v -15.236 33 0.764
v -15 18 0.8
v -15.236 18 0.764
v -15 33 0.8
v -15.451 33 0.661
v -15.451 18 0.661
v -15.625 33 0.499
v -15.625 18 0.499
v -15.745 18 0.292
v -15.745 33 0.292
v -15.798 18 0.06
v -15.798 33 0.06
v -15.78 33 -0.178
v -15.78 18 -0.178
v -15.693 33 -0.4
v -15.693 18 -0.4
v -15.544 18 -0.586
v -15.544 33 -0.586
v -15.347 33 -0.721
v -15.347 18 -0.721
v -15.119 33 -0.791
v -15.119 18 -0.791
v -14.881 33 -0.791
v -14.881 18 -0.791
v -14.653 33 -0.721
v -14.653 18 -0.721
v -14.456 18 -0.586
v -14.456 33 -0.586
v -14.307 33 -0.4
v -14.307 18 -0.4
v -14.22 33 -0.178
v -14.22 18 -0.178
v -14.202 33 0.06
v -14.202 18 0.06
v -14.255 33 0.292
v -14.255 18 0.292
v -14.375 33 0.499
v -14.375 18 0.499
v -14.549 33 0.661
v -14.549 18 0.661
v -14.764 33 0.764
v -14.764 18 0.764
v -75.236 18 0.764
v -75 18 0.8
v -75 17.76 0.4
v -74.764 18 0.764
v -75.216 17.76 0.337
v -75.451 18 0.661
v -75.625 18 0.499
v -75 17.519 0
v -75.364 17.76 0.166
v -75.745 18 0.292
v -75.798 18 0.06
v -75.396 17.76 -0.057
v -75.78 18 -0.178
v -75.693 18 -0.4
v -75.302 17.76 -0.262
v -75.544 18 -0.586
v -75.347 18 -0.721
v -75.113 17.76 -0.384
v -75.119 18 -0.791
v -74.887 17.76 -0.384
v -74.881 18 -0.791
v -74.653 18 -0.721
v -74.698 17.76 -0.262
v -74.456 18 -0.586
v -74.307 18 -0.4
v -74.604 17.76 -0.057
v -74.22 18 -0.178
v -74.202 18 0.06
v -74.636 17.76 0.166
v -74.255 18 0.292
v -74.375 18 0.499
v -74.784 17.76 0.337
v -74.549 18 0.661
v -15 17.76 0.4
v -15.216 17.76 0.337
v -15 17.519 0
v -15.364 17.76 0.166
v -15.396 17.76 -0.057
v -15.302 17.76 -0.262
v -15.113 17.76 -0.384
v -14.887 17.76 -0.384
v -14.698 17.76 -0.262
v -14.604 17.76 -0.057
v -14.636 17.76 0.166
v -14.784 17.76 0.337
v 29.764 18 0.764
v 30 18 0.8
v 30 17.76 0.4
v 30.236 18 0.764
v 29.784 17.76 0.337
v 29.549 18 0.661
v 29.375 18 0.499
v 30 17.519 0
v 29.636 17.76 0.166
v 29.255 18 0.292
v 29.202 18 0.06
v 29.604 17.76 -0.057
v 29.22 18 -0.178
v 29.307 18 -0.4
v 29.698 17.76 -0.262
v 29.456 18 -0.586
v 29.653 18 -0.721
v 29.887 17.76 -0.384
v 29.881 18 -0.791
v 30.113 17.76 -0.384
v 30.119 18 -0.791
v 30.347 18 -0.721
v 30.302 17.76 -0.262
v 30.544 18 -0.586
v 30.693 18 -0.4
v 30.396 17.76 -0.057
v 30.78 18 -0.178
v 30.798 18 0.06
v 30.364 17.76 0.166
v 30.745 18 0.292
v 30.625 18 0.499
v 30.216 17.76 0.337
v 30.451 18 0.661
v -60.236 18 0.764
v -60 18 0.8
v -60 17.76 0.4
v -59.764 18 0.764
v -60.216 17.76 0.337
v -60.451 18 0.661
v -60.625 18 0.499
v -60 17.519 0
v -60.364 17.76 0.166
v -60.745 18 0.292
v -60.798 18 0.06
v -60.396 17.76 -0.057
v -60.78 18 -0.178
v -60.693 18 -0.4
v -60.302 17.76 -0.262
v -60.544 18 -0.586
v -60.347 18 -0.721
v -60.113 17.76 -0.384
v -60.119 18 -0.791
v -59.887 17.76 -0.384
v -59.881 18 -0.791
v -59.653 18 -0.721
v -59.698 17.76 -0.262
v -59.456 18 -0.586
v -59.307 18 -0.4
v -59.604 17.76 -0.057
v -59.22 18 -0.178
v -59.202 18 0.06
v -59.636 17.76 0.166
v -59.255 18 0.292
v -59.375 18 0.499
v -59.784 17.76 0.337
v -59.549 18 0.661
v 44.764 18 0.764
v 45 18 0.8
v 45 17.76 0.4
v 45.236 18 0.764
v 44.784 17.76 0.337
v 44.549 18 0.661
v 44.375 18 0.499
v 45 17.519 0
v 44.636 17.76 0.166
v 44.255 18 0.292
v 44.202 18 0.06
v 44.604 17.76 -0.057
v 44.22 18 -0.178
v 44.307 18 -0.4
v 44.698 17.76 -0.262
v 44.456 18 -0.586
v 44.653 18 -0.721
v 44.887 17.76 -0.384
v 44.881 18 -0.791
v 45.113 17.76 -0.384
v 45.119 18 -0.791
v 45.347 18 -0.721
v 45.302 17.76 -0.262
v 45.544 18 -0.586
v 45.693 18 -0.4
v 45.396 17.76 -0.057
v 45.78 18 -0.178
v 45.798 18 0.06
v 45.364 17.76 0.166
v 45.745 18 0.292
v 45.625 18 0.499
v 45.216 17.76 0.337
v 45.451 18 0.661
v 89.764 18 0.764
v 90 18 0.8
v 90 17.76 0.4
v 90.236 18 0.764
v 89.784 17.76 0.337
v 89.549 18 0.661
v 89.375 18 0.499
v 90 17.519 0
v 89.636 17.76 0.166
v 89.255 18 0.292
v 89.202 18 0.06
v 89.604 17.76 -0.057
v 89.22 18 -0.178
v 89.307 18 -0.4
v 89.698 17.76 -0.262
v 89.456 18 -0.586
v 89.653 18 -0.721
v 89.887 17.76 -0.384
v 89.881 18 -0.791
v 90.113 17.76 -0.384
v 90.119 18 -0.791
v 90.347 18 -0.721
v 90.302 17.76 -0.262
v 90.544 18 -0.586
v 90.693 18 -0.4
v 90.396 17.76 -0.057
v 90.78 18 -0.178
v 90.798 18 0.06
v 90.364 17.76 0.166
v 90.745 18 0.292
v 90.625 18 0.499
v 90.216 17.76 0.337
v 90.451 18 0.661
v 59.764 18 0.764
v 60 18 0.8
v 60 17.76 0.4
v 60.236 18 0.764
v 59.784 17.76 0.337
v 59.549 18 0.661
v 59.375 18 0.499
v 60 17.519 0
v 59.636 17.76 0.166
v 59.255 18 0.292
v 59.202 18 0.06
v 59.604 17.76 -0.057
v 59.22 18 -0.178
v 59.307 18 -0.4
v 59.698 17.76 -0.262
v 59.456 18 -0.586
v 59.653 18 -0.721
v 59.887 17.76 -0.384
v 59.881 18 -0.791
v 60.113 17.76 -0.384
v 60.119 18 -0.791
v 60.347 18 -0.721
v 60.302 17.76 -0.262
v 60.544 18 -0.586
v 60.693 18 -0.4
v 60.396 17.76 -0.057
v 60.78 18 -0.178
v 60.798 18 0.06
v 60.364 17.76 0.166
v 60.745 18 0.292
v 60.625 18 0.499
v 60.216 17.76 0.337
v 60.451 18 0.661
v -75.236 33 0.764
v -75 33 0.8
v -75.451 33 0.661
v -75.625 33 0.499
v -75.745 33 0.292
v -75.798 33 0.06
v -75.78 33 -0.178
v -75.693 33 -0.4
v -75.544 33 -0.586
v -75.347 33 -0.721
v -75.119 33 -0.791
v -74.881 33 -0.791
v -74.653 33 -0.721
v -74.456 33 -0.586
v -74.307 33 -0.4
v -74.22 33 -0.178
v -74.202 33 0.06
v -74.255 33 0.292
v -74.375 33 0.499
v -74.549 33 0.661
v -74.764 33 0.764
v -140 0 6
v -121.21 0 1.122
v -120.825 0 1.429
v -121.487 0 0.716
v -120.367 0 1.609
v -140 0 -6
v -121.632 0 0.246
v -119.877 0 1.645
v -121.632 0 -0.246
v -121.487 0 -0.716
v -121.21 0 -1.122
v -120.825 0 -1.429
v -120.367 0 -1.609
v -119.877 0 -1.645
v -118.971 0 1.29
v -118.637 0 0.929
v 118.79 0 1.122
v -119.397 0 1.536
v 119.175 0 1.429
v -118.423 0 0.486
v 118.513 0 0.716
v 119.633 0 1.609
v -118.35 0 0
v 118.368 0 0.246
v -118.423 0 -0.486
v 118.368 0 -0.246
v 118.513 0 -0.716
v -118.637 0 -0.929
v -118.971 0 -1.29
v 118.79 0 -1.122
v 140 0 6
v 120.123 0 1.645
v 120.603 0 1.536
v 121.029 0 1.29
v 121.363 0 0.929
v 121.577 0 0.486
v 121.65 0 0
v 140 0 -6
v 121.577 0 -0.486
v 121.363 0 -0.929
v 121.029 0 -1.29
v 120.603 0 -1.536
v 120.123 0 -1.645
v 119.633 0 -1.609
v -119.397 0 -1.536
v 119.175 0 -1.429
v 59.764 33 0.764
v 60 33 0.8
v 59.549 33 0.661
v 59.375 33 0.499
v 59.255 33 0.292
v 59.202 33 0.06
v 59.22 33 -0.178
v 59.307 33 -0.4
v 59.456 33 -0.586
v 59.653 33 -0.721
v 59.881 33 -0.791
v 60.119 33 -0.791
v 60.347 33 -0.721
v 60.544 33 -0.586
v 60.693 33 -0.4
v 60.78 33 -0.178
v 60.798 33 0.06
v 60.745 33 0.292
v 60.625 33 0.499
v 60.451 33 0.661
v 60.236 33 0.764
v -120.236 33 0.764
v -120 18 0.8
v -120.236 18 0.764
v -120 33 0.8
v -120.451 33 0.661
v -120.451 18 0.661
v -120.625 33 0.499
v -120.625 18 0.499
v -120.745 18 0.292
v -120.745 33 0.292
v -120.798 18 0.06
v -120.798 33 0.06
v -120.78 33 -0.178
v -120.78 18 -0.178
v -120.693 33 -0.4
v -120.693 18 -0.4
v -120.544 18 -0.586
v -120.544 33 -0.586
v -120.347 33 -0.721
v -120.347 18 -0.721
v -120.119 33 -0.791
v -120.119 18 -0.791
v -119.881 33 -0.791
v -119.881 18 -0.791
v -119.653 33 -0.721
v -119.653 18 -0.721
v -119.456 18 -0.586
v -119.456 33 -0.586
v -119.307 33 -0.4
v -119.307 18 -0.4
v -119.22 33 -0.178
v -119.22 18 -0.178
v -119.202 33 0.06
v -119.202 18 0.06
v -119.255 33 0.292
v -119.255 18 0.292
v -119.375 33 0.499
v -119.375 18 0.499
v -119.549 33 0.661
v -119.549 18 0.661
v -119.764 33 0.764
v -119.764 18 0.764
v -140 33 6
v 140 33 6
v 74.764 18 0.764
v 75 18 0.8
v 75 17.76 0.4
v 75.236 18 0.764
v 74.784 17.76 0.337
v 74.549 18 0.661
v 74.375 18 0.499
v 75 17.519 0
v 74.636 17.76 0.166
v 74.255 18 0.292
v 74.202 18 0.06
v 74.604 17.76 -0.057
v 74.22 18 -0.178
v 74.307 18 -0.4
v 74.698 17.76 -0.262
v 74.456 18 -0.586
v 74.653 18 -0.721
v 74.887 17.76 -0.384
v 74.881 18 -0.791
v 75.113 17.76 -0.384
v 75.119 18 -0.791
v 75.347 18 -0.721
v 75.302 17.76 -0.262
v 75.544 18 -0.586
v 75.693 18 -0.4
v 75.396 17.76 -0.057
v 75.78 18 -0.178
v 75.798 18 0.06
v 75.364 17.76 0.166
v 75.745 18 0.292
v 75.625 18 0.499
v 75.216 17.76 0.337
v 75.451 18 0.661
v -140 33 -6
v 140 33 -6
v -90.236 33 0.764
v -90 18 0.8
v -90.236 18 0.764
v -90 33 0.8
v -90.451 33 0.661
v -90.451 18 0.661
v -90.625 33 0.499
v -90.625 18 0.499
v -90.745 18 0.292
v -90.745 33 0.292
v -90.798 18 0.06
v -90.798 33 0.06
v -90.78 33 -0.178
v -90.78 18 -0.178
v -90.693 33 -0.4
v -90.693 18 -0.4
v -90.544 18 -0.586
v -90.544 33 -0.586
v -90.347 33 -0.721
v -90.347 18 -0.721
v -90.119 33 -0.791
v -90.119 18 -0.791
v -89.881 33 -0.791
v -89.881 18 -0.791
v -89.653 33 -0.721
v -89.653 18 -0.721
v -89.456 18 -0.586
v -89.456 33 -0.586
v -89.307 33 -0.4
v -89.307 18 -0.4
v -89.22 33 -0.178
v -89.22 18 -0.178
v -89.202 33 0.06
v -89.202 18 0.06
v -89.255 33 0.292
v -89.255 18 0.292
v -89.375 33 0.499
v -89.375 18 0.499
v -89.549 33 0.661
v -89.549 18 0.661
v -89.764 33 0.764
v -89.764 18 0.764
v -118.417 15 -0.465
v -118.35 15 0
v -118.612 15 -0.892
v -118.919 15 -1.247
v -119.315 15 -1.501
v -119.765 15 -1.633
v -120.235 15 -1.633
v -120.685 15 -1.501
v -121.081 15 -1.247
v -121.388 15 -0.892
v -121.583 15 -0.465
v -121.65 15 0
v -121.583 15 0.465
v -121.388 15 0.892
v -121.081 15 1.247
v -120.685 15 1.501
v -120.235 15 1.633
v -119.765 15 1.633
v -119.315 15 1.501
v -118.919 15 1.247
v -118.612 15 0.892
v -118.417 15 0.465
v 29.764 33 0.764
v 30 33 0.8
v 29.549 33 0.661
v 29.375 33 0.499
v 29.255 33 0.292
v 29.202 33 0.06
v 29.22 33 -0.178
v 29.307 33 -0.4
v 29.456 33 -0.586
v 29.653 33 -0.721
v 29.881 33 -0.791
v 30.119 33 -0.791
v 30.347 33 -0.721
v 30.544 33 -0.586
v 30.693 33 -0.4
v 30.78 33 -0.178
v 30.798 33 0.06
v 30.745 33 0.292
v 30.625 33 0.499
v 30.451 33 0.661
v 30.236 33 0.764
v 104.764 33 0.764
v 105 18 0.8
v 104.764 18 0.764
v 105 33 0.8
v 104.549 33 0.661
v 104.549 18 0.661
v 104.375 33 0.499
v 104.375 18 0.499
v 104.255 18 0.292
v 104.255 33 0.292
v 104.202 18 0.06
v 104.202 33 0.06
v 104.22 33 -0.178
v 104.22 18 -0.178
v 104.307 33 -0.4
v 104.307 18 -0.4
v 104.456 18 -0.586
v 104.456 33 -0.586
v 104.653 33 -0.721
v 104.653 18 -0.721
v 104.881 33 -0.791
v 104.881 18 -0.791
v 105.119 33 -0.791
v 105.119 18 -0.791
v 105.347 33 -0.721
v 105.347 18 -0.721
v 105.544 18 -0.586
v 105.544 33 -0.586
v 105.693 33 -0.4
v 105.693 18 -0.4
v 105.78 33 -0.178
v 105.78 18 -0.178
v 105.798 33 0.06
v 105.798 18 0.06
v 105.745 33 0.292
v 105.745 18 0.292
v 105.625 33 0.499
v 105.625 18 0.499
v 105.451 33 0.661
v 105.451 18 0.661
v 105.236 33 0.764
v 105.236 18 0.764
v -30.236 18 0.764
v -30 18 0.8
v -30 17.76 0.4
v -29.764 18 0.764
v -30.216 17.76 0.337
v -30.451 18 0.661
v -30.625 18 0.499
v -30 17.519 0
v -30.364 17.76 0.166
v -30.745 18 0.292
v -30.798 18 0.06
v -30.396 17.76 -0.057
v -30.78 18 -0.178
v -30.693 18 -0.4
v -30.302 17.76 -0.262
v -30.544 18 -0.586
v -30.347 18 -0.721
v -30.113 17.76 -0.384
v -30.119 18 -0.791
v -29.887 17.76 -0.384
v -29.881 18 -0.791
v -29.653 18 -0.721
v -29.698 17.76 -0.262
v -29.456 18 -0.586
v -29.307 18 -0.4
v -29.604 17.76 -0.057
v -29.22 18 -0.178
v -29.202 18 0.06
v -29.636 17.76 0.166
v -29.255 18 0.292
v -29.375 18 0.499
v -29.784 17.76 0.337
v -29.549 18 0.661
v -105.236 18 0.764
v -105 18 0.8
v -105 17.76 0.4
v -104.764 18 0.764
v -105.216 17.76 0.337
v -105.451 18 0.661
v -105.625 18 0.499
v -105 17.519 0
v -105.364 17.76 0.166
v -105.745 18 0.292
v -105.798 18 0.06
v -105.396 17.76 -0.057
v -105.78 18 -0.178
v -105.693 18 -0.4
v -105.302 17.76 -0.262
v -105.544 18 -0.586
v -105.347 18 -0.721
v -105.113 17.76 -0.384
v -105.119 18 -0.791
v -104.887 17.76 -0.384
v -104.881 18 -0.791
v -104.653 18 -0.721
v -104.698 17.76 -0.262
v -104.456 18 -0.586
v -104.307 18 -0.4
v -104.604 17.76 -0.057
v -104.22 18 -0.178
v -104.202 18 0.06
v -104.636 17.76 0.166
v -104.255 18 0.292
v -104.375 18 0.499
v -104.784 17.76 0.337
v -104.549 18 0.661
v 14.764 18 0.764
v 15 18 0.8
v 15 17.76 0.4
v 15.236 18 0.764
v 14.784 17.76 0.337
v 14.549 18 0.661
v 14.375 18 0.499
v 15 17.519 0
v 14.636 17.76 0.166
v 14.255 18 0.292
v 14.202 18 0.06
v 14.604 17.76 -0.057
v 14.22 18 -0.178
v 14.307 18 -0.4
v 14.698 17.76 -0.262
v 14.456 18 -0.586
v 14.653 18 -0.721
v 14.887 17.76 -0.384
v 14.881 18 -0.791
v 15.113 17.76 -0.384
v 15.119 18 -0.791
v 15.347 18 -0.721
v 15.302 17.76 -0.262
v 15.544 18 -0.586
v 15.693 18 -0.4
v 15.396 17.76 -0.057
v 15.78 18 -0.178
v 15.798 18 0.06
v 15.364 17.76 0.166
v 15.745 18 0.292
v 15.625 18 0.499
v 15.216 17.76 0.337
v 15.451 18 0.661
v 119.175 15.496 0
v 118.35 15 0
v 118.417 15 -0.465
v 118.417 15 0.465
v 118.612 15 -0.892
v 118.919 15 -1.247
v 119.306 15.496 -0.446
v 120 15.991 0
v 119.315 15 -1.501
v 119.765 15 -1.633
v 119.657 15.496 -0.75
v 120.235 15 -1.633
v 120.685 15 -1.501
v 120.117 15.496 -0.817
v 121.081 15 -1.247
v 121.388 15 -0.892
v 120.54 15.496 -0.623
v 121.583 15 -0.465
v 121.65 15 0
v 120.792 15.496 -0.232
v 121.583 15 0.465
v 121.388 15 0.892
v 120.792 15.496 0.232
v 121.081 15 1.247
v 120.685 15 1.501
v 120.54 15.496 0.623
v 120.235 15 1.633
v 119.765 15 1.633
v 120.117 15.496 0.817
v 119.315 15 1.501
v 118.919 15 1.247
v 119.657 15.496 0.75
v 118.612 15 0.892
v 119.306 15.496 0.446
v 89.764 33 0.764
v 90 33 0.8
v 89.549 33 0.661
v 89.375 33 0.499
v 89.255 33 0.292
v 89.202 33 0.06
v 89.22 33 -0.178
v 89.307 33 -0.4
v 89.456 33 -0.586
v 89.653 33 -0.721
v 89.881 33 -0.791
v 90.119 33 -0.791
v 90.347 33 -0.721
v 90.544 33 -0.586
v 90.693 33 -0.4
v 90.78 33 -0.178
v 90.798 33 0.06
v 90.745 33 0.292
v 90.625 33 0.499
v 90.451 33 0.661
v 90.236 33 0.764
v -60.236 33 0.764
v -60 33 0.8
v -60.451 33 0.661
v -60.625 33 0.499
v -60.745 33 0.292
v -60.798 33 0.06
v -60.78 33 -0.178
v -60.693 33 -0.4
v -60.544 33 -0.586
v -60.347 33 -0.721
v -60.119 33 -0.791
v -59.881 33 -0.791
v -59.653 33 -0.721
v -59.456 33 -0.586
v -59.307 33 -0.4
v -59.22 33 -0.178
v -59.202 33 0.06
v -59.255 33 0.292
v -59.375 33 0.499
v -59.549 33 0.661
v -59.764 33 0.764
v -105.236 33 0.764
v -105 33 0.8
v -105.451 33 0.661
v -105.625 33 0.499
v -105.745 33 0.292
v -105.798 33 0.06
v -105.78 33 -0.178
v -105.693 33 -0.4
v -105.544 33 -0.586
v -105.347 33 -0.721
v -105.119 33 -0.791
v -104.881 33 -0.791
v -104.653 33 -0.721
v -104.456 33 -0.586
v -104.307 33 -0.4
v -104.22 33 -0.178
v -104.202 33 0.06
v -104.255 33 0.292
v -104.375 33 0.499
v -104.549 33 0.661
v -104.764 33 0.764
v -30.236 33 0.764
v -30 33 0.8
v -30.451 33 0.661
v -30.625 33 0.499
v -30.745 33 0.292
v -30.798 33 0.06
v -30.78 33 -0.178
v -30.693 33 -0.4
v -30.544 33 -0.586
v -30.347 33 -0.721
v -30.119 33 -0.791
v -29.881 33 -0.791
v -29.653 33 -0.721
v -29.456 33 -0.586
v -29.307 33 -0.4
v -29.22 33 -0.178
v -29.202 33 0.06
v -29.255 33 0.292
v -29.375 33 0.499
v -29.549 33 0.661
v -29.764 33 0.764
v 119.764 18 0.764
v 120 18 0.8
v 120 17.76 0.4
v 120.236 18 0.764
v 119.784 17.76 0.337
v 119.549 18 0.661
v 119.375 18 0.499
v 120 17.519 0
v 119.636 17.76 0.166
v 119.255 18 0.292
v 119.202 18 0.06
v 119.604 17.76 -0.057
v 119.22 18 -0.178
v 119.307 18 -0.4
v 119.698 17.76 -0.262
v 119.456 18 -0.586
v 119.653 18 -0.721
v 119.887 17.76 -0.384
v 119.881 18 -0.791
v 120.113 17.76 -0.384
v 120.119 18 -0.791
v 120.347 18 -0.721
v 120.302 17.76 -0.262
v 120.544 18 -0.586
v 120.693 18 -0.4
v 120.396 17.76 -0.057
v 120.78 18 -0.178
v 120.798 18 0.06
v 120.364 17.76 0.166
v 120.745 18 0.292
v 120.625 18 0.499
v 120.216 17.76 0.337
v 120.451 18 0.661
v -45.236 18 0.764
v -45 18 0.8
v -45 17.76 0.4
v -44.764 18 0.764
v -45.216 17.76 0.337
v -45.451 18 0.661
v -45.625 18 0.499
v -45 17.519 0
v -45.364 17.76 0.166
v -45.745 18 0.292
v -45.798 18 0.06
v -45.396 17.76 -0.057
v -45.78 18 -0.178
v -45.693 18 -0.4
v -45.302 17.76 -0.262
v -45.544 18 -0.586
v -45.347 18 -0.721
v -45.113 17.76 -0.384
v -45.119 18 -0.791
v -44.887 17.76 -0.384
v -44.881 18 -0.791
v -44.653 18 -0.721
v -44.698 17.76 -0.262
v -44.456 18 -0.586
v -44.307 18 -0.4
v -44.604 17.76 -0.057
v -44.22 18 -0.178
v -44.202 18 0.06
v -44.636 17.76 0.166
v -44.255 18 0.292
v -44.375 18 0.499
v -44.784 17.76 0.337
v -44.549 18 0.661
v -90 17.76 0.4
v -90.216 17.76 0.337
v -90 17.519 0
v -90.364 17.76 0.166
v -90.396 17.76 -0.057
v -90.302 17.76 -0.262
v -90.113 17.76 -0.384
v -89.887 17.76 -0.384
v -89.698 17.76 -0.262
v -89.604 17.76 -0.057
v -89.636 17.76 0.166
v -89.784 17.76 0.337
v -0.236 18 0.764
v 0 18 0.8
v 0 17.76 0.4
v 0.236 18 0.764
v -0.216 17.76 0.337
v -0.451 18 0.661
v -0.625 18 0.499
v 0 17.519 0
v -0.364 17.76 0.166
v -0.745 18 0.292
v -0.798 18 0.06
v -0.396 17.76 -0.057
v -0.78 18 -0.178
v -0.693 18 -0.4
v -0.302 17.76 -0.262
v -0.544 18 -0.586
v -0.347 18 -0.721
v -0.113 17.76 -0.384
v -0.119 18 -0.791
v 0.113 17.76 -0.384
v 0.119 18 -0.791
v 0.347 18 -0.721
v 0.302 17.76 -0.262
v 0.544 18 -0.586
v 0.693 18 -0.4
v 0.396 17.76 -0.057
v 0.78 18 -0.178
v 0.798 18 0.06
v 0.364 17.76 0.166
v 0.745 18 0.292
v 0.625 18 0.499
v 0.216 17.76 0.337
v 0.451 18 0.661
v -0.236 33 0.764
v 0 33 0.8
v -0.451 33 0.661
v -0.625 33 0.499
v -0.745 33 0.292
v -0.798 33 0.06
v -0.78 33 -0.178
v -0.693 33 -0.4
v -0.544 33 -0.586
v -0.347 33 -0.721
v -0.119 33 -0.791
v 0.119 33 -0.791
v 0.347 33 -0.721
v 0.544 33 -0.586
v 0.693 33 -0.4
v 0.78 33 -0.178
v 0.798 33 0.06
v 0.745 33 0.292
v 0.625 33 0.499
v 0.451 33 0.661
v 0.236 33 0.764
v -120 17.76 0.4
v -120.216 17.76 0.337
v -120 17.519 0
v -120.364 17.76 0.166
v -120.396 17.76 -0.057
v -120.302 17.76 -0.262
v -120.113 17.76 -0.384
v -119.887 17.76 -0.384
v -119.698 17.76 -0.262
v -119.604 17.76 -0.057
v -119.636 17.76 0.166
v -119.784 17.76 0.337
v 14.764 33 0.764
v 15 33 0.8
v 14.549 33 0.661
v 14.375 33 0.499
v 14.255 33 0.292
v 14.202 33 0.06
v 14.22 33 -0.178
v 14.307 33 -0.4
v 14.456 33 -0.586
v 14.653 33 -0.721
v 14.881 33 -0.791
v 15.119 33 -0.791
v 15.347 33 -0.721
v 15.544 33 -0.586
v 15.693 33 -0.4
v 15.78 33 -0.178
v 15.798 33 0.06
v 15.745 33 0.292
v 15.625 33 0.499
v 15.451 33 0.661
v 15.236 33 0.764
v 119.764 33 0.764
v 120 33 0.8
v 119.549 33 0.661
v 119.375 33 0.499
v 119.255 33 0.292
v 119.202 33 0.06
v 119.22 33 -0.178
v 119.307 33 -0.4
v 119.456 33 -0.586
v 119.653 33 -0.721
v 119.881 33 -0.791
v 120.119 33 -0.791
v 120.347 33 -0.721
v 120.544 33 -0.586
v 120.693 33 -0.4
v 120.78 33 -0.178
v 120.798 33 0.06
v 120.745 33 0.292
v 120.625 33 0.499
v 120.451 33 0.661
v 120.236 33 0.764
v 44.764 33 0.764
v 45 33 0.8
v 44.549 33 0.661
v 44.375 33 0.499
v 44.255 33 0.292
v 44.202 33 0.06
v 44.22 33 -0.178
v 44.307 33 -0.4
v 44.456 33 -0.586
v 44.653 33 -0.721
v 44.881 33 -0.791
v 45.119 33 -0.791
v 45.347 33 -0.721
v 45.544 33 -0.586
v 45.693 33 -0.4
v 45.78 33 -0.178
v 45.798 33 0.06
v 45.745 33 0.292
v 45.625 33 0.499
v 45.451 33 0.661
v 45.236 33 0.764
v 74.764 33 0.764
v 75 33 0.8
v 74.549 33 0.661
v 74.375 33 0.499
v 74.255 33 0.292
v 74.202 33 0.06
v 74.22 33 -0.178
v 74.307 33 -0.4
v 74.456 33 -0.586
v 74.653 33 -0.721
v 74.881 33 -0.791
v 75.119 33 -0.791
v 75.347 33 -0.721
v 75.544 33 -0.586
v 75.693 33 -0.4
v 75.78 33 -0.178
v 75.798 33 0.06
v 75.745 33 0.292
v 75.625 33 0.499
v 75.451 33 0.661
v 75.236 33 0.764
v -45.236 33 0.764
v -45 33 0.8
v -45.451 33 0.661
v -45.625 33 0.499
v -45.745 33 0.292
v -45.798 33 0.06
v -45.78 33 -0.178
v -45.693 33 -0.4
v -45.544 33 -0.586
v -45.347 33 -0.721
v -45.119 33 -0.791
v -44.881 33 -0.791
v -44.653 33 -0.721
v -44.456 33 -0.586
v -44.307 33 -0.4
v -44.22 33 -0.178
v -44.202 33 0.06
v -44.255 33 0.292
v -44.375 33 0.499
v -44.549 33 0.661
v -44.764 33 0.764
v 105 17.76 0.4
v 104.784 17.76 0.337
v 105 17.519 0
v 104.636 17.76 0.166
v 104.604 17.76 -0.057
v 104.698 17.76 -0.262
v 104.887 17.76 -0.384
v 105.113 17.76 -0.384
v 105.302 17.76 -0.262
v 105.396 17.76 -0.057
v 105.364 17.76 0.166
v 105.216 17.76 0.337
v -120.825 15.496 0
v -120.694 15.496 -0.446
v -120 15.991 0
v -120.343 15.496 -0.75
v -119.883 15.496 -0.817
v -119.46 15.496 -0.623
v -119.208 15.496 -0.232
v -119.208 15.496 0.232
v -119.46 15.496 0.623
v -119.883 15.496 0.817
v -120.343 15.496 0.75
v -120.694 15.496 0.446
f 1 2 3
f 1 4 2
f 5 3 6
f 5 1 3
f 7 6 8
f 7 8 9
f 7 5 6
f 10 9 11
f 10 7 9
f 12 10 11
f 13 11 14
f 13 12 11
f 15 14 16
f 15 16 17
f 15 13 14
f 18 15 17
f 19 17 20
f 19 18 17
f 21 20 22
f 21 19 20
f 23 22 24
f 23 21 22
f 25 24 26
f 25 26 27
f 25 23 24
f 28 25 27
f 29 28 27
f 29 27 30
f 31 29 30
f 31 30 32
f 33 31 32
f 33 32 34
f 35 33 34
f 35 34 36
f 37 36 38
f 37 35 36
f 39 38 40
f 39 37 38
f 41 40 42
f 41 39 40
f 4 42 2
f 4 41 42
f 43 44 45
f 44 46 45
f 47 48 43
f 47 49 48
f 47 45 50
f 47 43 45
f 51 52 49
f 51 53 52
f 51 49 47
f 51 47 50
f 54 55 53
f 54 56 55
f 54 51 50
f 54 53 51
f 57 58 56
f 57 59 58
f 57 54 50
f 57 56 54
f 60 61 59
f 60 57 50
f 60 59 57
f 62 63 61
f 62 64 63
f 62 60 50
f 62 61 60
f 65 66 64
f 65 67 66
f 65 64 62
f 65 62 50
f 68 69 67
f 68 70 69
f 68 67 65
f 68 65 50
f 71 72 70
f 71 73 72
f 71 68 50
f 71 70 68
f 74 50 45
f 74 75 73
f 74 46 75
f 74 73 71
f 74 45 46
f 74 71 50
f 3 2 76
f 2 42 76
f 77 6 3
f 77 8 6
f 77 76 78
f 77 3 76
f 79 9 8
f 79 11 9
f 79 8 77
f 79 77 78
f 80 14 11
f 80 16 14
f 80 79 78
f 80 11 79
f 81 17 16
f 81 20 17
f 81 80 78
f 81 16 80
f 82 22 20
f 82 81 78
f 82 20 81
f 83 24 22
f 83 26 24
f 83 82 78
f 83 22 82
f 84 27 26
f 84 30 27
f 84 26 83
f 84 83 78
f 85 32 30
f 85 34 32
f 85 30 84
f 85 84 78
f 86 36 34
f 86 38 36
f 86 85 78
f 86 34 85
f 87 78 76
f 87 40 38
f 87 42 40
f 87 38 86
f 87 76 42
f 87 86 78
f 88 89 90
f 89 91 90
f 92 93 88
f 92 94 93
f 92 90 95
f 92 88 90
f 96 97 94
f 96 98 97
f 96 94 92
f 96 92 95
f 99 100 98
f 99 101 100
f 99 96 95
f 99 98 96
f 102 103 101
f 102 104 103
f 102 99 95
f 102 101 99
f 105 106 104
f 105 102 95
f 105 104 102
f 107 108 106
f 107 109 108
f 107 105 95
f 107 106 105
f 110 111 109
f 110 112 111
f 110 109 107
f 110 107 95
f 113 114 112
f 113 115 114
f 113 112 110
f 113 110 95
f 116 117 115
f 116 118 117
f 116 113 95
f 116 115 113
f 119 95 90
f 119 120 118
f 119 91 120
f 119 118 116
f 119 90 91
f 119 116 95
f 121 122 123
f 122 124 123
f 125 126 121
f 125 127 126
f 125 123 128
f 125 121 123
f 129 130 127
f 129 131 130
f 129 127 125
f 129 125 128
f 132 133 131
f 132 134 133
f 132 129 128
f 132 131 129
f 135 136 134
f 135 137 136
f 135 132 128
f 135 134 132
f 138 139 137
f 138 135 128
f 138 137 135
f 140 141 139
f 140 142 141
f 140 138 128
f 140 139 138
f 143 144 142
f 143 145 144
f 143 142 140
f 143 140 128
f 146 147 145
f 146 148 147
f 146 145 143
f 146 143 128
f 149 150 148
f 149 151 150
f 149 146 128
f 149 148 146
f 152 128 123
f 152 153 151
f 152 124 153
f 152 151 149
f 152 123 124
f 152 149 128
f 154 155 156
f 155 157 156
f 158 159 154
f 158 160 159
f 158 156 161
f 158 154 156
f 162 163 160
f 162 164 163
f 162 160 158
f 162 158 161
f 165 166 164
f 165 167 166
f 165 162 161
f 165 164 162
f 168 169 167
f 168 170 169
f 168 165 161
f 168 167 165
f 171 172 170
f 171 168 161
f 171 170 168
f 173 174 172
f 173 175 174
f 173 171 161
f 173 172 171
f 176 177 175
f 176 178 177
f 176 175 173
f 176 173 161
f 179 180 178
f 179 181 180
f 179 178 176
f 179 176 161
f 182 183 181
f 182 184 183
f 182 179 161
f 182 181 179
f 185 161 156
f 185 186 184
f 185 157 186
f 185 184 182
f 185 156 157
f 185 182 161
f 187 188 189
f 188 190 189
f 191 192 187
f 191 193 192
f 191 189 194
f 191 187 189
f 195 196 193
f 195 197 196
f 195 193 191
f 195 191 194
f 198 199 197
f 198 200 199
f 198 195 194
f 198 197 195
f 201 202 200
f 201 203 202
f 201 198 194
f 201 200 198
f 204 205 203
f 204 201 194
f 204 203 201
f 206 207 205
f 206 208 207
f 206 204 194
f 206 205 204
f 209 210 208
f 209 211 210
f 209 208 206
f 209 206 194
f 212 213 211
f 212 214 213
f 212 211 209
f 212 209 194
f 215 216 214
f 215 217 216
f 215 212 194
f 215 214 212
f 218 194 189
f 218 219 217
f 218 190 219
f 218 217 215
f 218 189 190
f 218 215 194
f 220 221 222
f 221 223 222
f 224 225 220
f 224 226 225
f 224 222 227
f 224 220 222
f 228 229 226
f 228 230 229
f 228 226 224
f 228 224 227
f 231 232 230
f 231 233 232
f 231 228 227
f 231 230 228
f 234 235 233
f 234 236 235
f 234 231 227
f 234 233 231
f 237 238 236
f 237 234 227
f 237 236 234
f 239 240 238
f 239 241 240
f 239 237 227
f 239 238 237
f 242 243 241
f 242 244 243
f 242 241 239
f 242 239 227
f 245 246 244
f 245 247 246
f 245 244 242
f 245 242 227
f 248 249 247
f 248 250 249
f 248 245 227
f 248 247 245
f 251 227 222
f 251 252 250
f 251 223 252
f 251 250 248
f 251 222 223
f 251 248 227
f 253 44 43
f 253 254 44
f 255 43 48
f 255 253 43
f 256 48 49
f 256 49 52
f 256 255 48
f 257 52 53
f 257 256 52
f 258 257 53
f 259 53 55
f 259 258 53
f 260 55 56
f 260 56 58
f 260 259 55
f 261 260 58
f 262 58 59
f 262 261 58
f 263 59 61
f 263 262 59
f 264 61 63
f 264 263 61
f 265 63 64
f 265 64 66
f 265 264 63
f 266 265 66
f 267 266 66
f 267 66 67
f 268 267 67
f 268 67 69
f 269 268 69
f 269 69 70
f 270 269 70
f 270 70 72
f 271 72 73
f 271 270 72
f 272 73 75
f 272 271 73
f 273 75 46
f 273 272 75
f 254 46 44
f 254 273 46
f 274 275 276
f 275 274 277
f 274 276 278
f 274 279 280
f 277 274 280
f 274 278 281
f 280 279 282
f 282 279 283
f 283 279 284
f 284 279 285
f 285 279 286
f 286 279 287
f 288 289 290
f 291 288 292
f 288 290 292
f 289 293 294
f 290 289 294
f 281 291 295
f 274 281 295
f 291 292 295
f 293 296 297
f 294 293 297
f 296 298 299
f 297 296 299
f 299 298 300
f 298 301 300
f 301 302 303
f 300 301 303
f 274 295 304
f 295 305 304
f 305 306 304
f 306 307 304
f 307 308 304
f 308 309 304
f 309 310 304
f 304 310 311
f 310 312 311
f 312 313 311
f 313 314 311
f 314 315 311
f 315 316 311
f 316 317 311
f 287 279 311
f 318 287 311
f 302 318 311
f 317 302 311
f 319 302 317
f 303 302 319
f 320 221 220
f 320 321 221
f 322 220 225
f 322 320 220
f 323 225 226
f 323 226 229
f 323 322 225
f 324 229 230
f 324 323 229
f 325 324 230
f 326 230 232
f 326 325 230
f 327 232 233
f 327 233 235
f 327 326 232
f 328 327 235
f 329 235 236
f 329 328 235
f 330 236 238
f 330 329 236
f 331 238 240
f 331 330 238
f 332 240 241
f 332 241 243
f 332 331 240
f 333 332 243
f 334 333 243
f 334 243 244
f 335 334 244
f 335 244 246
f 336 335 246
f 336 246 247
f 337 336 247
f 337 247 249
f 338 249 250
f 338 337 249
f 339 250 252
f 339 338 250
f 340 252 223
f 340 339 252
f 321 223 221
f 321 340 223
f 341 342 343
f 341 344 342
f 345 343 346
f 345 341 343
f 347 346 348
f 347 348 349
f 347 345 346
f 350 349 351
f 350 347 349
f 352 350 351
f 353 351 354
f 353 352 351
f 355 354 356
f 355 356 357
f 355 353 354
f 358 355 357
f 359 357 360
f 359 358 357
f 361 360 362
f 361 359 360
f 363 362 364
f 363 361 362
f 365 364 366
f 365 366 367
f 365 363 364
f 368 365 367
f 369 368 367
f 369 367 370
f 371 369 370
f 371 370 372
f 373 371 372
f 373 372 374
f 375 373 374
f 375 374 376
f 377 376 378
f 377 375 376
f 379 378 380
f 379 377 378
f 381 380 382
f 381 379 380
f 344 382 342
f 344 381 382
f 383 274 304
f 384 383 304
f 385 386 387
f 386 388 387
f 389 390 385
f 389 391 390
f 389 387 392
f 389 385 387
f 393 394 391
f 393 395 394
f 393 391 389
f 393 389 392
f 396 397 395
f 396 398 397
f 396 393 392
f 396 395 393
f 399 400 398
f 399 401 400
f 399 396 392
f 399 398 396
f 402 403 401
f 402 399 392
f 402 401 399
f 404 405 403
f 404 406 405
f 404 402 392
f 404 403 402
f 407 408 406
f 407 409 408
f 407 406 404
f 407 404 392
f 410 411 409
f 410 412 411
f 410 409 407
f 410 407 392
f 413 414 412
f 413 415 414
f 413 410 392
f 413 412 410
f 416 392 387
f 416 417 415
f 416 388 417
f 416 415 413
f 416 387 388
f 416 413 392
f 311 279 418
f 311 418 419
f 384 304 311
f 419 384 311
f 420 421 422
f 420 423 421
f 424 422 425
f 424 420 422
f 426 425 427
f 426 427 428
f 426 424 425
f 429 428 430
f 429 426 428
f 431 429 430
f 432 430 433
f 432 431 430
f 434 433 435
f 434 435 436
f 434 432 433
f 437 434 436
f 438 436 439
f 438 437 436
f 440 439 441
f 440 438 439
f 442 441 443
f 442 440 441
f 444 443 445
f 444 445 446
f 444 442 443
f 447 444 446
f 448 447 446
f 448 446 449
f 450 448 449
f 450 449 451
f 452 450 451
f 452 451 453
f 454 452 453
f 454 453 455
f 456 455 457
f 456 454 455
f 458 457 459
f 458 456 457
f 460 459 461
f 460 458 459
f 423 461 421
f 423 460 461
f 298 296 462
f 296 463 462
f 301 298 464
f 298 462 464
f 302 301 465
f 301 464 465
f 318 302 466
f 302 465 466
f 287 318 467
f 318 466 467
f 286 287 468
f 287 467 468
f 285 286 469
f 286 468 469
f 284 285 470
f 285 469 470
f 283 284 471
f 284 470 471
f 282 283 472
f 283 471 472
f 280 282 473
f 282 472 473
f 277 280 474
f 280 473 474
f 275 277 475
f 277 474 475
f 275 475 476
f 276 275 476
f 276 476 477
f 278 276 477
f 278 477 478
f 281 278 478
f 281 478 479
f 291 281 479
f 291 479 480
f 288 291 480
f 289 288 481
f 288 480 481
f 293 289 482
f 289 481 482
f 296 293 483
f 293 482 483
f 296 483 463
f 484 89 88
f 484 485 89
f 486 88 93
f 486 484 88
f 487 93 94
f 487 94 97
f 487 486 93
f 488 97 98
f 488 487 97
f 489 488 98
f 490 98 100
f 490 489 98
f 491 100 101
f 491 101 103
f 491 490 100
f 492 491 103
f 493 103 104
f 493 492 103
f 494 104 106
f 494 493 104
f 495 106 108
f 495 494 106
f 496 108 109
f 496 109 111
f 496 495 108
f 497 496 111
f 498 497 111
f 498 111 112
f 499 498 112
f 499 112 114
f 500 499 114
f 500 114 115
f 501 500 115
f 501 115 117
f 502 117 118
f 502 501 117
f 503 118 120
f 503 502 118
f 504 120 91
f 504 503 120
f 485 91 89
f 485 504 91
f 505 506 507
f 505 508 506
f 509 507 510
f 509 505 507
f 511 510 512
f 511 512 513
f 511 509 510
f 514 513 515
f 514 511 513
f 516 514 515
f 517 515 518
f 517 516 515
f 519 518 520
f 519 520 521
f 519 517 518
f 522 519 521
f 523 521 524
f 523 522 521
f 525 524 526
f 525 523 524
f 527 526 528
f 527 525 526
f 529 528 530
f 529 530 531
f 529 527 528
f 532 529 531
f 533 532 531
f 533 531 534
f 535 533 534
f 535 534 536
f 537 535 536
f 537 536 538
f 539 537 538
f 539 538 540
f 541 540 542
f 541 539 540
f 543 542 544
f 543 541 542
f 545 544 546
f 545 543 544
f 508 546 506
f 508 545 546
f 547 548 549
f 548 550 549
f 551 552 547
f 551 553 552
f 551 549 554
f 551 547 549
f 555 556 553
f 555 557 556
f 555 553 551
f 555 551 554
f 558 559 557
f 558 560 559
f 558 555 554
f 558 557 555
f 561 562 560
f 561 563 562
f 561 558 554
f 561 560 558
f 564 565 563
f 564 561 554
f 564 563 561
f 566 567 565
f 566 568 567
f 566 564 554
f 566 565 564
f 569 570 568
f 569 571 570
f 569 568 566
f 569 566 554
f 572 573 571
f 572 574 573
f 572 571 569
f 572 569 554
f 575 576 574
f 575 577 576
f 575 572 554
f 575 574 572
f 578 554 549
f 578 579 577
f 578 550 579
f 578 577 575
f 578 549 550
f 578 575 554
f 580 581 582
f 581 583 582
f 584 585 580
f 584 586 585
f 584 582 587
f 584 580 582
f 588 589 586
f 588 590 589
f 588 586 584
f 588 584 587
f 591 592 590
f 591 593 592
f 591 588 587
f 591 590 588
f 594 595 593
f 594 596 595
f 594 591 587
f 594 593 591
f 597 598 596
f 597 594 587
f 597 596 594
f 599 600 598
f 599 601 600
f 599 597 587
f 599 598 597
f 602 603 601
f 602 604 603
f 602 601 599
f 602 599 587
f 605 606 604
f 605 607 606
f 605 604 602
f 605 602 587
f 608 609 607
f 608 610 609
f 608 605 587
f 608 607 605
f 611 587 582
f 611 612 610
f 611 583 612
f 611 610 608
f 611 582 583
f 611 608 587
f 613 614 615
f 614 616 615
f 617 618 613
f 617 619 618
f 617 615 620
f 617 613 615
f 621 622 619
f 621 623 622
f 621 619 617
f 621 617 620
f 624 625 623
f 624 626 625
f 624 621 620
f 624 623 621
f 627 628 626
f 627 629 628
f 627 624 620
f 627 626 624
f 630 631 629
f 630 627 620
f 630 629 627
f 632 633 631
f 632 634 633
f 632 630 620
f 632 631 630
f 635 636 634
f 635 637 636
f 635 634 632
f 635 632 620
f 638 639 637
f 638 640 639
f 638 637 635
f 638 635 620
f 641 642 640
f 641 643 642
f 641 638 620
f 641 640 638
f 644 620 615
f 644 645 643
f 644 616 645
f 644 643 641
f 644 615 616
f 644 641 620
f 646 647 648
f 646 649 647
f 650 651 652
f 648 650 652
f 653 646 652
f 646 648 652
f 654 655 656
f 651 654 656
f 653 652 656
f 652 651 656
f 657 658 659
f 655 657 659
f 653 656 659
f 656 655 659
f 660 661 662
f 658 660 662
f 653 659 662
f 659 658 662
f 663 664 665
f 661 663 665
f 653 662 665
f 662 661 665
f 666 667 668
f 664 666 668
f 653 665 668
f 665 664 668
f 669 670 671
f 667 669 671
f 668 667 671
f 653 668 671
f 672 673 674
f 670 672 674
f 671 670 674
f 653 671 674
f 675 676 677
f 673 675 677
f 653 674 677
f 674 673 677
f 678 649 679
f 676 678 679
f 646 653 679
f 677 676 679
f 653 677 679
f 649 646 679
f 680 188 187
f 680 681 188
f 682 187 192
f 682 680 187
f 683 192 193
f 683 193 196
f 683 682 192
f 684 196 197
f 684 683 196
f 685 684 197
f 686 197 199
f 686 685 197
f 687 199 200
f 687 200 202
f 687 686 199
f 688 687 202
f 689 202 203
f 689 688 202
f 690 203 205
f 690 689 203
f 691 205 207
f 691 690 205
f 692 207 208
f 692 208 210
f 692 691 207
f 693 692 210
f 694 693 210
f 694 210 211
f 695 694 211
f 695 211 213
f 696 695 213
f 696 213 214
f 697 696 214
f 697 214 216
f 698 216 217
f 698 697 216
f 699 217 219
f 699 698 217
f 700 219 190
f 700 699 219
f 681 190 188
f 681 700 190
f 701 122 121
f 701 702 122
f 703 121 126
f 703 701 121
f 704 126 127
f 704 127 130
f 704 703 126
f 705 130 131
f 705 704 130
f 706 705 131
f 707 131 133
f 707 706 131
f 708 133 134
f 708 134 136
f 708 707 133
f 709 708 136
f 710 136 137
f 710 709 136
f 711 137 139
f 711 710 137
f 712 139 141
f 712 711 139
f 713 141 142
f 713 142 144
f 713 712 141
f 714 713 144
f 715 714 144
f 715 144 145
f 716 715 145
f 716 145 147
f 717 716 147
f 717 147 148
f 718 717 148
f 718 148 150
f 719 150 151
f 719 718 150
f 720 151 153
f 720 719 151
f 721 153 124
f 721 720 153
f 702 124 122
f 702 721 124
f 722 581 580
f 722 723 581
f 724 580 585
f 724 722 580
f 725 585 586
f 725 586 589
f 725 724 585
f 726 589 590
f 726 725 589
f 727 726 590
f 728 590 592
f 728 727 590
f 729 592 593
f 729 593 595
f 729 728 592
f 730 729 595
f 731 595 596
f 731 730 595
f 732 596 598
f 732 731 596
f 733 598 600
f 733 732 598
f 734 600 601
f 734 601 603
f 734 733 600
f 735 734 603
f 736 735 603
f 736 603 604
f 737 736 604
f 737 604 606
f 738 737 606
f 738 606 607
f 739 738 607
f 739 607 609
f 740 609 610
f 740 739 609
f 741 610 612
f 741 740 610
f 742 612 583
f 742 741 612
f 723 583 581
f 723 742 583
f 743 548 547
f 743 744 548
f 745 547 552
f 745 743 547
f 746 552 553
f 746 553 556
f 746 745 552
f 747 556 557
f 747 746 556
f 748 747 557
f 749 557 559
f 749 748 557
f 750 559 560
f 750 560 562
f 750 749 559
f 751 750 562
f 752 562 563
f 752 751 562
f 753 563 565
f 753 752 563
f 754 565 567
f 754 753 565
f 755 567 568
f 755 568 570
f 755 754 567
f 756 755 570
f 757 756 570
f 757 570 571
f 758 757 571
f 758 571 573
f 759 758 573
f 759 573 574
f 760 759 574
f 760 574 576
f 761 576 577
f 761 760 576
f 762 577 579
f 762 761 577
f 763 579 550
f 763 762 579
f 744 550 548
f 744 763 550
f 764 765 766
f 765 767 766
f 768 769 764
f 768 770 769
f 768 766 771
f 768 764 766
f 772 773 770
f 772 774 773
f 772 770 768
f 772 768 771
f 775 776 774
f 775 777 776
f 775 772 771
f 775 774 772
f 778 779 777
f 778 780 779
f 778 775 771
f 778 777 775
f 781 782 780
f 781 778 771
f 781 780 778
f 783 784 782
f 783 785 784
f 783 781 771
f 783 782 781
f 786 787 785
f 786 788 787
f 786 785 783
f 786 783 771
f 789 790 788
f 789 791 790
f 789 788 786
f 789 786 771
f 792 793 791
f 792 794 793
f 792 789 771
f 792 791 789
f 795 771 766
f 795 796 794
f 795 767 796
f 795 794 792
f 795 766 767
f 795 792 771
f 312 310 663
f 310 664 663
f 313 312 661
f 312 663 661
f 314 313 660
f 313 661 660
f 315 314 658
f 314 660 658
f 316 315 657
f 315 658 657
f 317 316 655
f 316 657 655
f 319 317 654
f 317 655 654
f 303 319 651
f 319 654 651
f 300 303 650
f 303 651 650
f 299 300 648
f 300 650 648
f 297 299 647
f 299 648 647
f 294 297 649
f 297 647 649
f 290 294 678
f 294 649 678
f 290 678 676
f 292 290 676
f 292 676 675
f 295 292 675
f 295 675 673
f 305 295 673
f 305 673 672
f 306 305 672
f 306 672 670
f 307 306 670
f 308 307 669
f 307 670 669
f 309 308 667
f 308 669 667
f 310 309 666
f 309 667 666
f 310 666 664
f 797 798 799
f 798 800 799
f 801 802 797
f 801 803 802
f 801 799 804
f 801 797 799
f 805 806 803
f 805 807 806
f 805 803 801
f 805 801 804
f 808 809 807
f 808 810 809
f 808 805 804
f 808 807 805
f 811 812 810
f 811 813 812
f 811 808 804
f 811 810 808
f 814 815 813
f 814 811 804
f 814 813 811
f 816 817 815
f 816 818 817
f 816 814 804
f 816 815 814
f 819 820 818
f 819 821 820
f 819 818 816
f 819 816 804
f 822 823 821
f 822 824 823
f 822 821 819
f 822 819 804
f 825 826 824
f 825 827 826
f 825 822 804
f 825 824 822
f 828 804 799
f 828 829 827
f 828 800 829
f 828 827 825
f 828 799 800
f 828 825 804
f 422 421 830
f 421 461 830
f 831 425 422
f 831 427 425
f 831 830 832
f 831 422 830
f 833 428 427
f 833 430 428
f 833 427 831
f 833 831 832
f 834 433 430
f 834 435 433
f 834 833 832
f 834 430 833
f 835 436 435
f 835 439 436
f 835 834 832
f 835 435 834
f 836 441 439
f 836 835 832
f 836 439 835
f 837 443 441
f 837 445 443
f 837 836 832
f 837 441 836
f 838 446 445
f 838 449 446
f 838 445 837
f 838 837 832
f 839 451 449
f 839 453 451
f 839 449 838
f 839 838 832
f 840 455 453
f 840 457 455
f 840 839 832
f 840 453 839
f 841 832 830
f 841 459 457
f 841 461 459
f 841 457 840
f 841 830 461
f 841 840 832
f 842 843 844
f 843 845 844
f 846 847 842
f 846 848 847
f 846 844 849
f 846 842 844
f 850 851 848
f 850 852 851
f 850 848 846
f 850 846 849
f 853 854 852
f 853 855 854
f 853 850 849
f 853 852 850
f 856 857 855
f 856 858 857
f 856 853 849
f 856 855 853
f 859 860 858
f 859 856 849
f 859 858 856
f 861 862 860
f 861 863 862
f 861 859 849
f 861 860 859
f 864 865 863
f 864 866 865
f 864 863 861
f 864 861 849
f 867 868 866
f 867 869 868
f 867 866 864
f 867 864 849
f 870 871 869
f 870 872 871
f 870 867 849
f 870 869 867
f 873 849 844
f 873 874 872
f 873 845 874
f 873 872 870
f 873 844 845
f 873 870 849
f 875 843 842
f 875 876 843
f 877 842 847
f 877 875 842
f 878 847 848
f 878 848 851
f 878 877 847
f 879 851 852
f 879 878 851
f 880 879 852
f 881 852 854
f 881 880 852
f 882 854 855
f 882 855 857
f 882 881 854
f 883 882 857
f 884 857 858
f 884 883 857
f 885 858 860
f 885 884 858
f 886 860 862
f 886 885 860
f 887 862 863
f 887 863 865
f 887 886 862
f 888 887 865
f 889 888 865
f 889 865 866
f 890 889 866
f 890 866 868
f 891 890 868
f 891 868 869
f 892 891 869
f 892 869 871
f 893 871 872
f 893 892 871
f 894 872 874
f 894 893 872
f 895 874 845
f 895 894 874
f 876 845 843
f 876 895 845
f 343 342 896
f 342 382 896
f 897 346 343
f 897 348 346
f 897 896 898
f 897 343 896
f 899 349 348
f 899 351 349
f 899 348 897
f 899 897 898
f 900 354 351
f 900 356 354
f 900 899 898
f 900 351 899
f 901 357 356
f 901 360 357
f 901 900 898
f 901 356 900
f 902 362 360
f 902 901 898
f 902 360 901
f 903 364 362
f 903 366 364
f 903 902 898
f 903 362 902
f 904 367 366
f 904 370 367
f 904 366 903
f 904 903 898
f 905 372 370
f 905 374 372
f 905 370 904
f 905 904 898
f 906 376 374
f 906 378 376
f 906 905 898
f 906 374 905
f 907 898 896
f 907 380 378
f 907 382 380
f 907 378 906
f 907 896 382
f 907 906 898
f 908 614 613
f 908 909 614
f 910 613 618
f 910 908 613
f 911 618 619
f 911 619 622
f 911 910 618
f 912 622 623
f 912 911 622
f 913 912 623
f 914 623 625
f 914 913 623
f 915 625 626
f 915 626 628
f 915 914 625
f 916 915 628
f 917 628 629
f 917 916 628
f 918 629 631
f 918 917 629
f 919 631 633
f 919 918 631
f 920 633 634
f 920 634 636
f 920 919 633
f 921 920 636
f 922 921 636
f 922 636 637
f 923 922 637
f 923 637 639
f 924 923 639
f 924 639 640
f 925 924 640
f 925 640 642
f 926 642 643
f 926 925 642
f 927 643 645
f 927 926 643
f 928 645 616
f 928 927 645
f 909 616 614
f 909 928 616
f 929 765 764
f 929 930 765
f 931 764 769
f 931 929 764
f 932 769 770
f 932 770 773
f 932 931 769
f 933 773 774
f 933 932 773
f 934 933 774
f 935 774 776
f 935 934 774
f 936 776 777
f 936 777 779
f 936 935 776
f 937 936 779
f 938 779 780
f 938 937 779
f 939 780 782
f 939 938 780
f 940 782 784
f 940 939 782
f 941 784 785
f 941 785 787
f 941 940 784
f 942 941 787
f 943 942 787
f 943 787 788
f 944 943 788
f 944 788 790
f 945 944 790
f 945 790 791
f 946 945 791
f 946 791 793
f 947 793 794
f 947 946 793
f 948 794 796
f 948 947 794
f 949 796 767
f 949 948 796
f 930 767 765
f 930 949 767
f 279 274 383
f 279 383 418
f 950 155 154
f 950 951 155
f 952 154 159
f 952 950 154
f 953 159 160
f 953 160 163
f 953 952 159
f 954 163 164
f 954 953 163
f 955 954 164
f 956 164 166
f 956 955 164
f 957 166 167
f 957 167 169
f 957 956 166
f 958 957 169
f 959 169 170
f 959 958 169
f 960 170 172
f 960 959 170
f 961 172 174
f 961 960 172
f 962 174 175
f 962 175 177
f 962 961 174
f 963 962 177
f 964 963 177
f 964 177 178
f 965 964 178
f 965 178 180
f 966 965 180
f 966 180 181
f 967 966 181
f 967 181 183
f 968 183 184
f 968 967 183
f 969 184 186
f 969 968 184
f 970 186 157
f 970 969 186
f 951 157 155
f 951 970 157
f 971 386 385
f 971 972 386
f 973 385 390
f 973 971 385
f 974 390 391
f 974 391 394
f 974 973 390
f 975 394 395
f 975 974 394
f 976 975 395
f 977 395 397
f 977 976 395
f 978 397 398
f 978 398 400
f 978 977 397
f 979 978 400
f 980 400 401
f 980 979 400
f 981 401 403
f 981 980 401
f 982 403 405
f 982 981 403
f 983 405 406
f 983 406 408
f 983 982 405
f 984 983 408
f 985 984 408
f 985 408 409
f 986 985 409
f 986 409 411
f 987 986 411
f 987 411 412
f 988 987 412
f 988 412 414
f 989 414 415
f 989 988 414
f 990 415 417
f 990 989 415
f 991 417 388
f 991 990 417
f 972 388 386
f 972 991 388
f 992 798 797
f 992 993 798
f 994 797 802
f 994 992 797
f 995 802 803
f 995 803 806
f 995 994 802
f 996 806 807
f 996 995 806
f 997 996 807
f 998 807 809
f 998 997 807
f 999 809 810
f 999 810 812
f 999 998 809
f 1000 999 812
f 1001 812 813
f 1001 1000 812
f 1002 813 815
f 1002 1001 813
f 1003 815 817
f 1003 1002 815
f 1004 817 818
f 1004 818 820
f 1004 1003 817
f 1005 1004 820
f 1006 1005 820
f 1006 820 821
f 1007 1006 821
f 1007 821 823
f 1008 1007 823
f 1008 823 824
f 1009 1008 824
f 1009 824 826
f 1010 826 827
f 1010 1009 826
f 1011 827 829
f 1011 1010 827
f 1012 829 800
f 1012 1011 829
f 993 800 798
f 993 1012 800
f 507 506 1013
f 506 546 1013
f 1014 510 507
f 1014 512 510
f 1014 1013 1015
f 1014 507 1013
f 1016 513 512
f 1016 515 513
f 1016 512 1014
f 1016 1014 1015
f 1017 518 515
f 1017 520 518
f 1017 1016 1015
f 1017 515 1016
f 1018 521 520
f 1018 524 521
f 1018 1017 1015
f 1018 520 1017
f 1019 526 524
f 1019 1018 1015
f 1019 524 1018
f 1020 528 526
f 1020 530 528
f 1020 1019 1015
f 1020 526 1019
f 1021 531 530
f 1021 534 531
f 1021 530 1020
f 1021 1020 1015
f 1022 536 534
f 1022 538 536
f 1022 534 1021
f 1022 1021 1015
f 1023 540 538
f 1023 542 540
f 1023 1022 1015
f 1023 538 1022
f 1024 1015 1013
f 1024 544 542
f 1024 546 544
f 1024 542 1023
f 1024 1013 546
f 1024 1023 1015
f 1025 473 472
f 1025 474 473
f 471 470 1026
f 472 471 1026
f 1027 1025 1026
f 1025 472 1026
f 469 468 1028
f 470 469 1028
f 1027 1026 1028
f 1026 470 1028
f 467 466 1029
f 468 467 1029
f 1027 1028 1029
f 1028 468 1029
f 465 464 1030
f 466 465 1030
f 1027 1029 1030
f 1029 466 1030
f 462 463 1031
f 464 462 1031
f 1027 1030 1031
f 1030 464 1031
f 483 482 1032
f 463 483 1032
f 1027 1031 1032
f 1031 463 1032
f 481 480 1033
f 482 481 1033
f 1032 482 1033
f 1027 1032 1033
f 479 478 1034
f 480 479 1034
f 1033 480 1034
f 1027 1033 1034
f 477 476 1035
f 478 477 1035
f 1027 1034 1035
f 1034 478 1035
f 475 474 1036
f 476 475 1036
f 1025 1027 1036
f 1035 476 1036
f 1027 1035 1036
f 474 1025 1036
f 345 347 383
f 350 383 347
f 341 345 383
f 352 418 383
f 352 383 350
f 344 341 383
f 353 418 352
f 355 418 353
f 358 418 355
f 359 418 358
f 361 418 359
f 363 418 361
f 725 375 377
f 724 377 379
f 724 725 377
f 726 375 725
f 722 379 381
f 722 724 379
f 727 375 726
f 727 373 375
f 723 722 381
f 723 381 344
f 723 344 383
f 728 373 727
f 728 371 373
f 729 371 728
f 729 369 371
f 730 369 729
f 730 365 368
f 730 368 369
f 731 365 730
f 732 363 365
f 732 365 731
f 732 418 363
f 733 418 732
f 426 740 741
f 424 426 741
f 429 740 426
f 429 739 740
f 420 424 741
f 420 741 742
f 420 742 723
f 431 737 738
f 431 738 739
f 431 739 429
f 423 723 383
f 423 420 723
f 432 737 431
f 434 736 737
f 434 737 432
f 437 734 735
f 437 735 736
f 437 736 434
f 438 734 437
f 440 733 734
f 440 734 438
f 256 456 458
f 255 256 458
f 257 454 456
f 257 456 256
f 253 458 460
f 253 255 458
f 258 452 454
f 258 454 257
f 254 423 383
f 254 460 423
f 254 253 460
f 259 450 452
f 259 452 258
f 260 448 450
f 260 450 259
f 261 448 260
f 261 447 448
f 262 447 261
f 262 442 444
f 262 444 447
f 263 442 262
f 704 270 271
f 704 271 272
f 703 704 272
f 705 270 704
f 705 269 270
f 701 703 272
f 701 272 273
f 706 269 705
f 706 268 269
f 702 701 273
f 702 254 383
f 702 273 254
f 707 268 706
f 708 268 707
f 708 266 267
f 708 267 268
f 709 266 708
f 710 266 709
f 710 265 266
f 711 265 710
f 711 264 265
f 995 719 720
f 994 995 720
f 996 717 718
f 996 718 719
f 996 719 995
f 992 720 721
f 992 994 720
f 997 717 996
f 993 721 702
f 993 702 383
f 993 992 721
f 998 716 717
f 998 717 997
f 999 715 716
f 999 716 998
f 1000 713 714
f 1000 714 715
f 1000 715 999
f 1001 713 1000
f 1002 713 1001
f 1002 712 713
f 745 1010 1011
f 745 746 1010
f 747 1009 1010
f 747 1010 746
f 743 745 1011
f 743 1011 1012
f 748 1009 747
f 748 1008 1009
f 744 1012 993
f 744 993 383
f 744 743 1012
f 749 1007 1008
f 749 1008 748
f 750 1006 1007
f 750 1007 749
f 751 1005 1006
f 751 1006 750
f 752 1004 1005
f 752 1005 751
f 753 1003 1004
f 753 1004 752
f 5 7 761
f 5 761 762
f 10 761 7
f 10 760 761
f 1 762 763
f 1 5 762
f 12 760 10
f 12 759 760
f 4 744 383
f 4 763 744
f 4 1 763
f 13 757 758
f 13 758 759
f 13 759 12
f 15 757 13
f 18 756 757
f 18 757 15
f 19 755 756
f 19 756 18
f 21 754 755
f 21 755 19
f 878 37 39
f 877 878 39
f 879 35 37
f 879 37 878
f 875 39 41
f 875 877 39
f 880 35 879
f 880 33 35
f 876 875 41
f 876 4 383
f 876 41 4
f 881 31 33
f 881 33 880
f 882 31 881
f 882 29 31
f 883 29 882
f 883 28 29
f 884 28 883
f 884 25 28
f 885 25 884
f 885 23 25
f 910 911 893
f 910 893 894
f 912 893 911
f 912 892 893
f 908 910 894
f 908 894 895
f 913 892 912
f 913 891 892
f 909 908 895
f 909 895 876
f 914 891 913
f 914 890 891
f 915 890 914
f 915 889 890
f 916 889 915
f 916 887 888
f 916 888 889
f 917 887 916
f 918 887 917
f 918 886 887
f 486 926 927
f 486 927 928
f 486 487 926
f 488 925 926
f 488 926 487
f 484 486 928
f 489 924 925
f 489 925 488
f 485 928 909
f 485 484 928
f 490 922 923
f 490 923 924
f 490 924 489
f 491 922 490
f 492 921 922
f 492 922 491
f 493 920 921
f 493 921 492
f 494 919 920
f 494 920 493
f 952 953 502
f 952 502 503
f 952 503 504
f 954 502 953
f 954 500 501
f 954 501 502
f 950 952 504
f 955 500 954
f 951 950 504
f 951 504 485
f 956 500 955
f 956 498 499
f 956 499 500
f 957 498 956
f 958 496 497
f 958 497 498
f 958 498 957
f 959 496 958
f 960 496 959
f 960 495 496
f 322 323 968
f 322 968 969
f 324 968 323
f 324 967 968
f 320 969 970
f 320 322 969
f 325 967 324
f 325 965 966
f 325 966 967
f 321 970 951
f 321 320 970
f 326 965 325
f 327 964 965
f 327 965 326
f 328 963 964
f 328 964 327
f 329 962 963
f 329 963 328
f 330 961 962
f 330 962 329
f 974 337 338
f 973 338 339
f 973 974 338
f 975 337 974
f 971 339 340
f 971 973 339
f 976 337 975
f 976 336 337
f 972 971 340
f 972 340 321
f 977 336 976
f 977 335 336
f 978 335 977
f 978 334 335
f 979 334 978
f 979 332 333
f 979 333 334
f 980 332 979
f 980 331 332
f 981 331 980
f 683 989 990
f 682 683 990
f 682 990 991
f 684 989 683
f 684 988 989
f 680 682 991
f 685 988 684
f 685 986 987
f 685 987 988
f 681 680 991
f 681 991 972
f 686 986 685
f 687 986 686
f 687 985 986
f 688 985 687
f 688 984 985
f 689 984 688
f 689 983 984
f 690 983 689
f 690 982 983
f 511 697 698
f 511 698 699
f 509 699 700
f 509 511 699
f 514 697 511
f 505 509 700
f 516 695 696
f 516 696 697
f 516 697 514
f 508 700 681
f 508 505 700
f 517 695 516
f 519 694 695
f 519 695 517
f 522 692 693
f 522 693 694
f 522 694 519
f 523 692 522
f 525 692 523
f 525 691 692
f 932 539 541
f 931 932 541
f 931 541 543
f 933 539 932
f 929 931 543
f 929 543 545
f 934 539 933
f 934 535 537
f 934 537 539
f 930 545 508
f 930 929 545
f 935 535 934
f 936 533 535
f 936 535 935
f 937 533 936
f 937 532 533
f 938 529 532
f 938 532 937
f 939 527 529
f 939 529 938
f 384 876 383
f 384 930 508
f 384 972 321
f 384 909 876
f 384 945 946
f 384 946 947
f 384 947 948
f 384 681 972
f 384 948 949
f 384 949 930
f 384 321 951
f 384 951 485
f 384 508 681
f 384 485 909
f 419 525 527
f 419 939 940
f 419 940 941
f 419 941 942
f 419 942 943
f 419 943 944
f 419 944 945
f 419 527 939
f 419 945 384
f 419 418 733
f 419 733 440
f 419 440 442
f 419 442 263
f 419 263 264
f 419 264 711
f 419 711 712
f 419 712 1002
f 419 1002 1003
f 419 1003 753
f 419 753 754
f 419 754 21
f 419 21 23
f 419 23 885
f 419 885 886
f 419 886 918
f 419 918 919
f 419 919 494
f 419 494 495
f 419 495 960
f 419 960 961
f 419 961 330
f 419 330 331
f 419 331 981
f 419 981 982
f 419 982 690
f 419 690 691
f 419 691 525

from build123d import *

# Parameters (mm, degrees)
SKETCH1_W             = 280
SKETCH1_H             = 12
BOSS_EXTRUDE1_DEPTH   = 33
LPATTERN1_COUNT       = 9
LPATTERN1_PITCH       = 15
LPATTERN1_COL_COUNT   = 9
LPATTERN1_COL_PITCH   = 15
M4_TAPPED_HOLE1_D     = 3.3
M4_TAPPED_HOLE1_DEPTH = 15
M4_TAPPED_HOLE1_TIP   = 0.991420021


with BuildPart() as part:
    # Sketch1 → Boss-Extrude1 (new body)
    with BuildSketch(Plane(origin=(0, 0, 0), x_dir=(1, 0, 0), z_dir=(0, 1, 0))):
        Rectangle(SKETCH1_W, SKETCH1_H)
    extrude(amount=BOSS_EXTRUDE1_DEPTH)

    # Sketch4 → M2 Tapped Hole1 (revolve, cut)
    with BuildSketch(Plane(origin=(0, 33, 0), x_dir=(0, 0, 1), z_dir=(1, 0, 0))):
        Polygon((0, 0), (0, 15.480688495), (0.8, 15), (0.8, 0), align=None)
    m2_tapped_hole1 = revolve(axis=Axis((0, 39.35, 0), (0, -1, 0)), mode=Mode.SUBTRACT)

    # LPattern1: M2 Tapped Hole1 ×9
    with Locations(*[(i * LPATTERN1_PITCH, 0, 0) for i in range(1, LPATTERN1_COUNT)]):
        add(m2_tapped_hole1, mode=Mode.SUBTRACT)

    # LPattern1 col: M2 Tapped Hole1 ×9
    with Locations(*[(-i * LPATTERN1_COL_PITCH, 0, 0) for i in range(1, LPATTERN1_COL_COUNT)]):
        add(m2_tapped_hole1, mode=Mode.SUBTRACT)

    # M4 Tapped Hole1
    with Locations(Plane(origin=(0, 0, 0), x_dir=(-1, 0, 0), z_dir=(0, -1, 0))):
        with Locations((-120, 0), (120, 0)):
            Hole(M4_TAPPED_HOLE1_D / 2, depth=M4_TAPPED_HOLE1_DEPTH)
            with Locations((0, 0, -(M4_TAPPED_HOLE1_DEPTH + M4_TAPPED_HOLE1_TIP / 2))):  # 118° drill point
                Cone(0, M4_TAPPED_HOLE1_D / 2, M4_TAPPED_HOLE1_TIP, mode=Mode.SUBTRACT)


solid = part.part
